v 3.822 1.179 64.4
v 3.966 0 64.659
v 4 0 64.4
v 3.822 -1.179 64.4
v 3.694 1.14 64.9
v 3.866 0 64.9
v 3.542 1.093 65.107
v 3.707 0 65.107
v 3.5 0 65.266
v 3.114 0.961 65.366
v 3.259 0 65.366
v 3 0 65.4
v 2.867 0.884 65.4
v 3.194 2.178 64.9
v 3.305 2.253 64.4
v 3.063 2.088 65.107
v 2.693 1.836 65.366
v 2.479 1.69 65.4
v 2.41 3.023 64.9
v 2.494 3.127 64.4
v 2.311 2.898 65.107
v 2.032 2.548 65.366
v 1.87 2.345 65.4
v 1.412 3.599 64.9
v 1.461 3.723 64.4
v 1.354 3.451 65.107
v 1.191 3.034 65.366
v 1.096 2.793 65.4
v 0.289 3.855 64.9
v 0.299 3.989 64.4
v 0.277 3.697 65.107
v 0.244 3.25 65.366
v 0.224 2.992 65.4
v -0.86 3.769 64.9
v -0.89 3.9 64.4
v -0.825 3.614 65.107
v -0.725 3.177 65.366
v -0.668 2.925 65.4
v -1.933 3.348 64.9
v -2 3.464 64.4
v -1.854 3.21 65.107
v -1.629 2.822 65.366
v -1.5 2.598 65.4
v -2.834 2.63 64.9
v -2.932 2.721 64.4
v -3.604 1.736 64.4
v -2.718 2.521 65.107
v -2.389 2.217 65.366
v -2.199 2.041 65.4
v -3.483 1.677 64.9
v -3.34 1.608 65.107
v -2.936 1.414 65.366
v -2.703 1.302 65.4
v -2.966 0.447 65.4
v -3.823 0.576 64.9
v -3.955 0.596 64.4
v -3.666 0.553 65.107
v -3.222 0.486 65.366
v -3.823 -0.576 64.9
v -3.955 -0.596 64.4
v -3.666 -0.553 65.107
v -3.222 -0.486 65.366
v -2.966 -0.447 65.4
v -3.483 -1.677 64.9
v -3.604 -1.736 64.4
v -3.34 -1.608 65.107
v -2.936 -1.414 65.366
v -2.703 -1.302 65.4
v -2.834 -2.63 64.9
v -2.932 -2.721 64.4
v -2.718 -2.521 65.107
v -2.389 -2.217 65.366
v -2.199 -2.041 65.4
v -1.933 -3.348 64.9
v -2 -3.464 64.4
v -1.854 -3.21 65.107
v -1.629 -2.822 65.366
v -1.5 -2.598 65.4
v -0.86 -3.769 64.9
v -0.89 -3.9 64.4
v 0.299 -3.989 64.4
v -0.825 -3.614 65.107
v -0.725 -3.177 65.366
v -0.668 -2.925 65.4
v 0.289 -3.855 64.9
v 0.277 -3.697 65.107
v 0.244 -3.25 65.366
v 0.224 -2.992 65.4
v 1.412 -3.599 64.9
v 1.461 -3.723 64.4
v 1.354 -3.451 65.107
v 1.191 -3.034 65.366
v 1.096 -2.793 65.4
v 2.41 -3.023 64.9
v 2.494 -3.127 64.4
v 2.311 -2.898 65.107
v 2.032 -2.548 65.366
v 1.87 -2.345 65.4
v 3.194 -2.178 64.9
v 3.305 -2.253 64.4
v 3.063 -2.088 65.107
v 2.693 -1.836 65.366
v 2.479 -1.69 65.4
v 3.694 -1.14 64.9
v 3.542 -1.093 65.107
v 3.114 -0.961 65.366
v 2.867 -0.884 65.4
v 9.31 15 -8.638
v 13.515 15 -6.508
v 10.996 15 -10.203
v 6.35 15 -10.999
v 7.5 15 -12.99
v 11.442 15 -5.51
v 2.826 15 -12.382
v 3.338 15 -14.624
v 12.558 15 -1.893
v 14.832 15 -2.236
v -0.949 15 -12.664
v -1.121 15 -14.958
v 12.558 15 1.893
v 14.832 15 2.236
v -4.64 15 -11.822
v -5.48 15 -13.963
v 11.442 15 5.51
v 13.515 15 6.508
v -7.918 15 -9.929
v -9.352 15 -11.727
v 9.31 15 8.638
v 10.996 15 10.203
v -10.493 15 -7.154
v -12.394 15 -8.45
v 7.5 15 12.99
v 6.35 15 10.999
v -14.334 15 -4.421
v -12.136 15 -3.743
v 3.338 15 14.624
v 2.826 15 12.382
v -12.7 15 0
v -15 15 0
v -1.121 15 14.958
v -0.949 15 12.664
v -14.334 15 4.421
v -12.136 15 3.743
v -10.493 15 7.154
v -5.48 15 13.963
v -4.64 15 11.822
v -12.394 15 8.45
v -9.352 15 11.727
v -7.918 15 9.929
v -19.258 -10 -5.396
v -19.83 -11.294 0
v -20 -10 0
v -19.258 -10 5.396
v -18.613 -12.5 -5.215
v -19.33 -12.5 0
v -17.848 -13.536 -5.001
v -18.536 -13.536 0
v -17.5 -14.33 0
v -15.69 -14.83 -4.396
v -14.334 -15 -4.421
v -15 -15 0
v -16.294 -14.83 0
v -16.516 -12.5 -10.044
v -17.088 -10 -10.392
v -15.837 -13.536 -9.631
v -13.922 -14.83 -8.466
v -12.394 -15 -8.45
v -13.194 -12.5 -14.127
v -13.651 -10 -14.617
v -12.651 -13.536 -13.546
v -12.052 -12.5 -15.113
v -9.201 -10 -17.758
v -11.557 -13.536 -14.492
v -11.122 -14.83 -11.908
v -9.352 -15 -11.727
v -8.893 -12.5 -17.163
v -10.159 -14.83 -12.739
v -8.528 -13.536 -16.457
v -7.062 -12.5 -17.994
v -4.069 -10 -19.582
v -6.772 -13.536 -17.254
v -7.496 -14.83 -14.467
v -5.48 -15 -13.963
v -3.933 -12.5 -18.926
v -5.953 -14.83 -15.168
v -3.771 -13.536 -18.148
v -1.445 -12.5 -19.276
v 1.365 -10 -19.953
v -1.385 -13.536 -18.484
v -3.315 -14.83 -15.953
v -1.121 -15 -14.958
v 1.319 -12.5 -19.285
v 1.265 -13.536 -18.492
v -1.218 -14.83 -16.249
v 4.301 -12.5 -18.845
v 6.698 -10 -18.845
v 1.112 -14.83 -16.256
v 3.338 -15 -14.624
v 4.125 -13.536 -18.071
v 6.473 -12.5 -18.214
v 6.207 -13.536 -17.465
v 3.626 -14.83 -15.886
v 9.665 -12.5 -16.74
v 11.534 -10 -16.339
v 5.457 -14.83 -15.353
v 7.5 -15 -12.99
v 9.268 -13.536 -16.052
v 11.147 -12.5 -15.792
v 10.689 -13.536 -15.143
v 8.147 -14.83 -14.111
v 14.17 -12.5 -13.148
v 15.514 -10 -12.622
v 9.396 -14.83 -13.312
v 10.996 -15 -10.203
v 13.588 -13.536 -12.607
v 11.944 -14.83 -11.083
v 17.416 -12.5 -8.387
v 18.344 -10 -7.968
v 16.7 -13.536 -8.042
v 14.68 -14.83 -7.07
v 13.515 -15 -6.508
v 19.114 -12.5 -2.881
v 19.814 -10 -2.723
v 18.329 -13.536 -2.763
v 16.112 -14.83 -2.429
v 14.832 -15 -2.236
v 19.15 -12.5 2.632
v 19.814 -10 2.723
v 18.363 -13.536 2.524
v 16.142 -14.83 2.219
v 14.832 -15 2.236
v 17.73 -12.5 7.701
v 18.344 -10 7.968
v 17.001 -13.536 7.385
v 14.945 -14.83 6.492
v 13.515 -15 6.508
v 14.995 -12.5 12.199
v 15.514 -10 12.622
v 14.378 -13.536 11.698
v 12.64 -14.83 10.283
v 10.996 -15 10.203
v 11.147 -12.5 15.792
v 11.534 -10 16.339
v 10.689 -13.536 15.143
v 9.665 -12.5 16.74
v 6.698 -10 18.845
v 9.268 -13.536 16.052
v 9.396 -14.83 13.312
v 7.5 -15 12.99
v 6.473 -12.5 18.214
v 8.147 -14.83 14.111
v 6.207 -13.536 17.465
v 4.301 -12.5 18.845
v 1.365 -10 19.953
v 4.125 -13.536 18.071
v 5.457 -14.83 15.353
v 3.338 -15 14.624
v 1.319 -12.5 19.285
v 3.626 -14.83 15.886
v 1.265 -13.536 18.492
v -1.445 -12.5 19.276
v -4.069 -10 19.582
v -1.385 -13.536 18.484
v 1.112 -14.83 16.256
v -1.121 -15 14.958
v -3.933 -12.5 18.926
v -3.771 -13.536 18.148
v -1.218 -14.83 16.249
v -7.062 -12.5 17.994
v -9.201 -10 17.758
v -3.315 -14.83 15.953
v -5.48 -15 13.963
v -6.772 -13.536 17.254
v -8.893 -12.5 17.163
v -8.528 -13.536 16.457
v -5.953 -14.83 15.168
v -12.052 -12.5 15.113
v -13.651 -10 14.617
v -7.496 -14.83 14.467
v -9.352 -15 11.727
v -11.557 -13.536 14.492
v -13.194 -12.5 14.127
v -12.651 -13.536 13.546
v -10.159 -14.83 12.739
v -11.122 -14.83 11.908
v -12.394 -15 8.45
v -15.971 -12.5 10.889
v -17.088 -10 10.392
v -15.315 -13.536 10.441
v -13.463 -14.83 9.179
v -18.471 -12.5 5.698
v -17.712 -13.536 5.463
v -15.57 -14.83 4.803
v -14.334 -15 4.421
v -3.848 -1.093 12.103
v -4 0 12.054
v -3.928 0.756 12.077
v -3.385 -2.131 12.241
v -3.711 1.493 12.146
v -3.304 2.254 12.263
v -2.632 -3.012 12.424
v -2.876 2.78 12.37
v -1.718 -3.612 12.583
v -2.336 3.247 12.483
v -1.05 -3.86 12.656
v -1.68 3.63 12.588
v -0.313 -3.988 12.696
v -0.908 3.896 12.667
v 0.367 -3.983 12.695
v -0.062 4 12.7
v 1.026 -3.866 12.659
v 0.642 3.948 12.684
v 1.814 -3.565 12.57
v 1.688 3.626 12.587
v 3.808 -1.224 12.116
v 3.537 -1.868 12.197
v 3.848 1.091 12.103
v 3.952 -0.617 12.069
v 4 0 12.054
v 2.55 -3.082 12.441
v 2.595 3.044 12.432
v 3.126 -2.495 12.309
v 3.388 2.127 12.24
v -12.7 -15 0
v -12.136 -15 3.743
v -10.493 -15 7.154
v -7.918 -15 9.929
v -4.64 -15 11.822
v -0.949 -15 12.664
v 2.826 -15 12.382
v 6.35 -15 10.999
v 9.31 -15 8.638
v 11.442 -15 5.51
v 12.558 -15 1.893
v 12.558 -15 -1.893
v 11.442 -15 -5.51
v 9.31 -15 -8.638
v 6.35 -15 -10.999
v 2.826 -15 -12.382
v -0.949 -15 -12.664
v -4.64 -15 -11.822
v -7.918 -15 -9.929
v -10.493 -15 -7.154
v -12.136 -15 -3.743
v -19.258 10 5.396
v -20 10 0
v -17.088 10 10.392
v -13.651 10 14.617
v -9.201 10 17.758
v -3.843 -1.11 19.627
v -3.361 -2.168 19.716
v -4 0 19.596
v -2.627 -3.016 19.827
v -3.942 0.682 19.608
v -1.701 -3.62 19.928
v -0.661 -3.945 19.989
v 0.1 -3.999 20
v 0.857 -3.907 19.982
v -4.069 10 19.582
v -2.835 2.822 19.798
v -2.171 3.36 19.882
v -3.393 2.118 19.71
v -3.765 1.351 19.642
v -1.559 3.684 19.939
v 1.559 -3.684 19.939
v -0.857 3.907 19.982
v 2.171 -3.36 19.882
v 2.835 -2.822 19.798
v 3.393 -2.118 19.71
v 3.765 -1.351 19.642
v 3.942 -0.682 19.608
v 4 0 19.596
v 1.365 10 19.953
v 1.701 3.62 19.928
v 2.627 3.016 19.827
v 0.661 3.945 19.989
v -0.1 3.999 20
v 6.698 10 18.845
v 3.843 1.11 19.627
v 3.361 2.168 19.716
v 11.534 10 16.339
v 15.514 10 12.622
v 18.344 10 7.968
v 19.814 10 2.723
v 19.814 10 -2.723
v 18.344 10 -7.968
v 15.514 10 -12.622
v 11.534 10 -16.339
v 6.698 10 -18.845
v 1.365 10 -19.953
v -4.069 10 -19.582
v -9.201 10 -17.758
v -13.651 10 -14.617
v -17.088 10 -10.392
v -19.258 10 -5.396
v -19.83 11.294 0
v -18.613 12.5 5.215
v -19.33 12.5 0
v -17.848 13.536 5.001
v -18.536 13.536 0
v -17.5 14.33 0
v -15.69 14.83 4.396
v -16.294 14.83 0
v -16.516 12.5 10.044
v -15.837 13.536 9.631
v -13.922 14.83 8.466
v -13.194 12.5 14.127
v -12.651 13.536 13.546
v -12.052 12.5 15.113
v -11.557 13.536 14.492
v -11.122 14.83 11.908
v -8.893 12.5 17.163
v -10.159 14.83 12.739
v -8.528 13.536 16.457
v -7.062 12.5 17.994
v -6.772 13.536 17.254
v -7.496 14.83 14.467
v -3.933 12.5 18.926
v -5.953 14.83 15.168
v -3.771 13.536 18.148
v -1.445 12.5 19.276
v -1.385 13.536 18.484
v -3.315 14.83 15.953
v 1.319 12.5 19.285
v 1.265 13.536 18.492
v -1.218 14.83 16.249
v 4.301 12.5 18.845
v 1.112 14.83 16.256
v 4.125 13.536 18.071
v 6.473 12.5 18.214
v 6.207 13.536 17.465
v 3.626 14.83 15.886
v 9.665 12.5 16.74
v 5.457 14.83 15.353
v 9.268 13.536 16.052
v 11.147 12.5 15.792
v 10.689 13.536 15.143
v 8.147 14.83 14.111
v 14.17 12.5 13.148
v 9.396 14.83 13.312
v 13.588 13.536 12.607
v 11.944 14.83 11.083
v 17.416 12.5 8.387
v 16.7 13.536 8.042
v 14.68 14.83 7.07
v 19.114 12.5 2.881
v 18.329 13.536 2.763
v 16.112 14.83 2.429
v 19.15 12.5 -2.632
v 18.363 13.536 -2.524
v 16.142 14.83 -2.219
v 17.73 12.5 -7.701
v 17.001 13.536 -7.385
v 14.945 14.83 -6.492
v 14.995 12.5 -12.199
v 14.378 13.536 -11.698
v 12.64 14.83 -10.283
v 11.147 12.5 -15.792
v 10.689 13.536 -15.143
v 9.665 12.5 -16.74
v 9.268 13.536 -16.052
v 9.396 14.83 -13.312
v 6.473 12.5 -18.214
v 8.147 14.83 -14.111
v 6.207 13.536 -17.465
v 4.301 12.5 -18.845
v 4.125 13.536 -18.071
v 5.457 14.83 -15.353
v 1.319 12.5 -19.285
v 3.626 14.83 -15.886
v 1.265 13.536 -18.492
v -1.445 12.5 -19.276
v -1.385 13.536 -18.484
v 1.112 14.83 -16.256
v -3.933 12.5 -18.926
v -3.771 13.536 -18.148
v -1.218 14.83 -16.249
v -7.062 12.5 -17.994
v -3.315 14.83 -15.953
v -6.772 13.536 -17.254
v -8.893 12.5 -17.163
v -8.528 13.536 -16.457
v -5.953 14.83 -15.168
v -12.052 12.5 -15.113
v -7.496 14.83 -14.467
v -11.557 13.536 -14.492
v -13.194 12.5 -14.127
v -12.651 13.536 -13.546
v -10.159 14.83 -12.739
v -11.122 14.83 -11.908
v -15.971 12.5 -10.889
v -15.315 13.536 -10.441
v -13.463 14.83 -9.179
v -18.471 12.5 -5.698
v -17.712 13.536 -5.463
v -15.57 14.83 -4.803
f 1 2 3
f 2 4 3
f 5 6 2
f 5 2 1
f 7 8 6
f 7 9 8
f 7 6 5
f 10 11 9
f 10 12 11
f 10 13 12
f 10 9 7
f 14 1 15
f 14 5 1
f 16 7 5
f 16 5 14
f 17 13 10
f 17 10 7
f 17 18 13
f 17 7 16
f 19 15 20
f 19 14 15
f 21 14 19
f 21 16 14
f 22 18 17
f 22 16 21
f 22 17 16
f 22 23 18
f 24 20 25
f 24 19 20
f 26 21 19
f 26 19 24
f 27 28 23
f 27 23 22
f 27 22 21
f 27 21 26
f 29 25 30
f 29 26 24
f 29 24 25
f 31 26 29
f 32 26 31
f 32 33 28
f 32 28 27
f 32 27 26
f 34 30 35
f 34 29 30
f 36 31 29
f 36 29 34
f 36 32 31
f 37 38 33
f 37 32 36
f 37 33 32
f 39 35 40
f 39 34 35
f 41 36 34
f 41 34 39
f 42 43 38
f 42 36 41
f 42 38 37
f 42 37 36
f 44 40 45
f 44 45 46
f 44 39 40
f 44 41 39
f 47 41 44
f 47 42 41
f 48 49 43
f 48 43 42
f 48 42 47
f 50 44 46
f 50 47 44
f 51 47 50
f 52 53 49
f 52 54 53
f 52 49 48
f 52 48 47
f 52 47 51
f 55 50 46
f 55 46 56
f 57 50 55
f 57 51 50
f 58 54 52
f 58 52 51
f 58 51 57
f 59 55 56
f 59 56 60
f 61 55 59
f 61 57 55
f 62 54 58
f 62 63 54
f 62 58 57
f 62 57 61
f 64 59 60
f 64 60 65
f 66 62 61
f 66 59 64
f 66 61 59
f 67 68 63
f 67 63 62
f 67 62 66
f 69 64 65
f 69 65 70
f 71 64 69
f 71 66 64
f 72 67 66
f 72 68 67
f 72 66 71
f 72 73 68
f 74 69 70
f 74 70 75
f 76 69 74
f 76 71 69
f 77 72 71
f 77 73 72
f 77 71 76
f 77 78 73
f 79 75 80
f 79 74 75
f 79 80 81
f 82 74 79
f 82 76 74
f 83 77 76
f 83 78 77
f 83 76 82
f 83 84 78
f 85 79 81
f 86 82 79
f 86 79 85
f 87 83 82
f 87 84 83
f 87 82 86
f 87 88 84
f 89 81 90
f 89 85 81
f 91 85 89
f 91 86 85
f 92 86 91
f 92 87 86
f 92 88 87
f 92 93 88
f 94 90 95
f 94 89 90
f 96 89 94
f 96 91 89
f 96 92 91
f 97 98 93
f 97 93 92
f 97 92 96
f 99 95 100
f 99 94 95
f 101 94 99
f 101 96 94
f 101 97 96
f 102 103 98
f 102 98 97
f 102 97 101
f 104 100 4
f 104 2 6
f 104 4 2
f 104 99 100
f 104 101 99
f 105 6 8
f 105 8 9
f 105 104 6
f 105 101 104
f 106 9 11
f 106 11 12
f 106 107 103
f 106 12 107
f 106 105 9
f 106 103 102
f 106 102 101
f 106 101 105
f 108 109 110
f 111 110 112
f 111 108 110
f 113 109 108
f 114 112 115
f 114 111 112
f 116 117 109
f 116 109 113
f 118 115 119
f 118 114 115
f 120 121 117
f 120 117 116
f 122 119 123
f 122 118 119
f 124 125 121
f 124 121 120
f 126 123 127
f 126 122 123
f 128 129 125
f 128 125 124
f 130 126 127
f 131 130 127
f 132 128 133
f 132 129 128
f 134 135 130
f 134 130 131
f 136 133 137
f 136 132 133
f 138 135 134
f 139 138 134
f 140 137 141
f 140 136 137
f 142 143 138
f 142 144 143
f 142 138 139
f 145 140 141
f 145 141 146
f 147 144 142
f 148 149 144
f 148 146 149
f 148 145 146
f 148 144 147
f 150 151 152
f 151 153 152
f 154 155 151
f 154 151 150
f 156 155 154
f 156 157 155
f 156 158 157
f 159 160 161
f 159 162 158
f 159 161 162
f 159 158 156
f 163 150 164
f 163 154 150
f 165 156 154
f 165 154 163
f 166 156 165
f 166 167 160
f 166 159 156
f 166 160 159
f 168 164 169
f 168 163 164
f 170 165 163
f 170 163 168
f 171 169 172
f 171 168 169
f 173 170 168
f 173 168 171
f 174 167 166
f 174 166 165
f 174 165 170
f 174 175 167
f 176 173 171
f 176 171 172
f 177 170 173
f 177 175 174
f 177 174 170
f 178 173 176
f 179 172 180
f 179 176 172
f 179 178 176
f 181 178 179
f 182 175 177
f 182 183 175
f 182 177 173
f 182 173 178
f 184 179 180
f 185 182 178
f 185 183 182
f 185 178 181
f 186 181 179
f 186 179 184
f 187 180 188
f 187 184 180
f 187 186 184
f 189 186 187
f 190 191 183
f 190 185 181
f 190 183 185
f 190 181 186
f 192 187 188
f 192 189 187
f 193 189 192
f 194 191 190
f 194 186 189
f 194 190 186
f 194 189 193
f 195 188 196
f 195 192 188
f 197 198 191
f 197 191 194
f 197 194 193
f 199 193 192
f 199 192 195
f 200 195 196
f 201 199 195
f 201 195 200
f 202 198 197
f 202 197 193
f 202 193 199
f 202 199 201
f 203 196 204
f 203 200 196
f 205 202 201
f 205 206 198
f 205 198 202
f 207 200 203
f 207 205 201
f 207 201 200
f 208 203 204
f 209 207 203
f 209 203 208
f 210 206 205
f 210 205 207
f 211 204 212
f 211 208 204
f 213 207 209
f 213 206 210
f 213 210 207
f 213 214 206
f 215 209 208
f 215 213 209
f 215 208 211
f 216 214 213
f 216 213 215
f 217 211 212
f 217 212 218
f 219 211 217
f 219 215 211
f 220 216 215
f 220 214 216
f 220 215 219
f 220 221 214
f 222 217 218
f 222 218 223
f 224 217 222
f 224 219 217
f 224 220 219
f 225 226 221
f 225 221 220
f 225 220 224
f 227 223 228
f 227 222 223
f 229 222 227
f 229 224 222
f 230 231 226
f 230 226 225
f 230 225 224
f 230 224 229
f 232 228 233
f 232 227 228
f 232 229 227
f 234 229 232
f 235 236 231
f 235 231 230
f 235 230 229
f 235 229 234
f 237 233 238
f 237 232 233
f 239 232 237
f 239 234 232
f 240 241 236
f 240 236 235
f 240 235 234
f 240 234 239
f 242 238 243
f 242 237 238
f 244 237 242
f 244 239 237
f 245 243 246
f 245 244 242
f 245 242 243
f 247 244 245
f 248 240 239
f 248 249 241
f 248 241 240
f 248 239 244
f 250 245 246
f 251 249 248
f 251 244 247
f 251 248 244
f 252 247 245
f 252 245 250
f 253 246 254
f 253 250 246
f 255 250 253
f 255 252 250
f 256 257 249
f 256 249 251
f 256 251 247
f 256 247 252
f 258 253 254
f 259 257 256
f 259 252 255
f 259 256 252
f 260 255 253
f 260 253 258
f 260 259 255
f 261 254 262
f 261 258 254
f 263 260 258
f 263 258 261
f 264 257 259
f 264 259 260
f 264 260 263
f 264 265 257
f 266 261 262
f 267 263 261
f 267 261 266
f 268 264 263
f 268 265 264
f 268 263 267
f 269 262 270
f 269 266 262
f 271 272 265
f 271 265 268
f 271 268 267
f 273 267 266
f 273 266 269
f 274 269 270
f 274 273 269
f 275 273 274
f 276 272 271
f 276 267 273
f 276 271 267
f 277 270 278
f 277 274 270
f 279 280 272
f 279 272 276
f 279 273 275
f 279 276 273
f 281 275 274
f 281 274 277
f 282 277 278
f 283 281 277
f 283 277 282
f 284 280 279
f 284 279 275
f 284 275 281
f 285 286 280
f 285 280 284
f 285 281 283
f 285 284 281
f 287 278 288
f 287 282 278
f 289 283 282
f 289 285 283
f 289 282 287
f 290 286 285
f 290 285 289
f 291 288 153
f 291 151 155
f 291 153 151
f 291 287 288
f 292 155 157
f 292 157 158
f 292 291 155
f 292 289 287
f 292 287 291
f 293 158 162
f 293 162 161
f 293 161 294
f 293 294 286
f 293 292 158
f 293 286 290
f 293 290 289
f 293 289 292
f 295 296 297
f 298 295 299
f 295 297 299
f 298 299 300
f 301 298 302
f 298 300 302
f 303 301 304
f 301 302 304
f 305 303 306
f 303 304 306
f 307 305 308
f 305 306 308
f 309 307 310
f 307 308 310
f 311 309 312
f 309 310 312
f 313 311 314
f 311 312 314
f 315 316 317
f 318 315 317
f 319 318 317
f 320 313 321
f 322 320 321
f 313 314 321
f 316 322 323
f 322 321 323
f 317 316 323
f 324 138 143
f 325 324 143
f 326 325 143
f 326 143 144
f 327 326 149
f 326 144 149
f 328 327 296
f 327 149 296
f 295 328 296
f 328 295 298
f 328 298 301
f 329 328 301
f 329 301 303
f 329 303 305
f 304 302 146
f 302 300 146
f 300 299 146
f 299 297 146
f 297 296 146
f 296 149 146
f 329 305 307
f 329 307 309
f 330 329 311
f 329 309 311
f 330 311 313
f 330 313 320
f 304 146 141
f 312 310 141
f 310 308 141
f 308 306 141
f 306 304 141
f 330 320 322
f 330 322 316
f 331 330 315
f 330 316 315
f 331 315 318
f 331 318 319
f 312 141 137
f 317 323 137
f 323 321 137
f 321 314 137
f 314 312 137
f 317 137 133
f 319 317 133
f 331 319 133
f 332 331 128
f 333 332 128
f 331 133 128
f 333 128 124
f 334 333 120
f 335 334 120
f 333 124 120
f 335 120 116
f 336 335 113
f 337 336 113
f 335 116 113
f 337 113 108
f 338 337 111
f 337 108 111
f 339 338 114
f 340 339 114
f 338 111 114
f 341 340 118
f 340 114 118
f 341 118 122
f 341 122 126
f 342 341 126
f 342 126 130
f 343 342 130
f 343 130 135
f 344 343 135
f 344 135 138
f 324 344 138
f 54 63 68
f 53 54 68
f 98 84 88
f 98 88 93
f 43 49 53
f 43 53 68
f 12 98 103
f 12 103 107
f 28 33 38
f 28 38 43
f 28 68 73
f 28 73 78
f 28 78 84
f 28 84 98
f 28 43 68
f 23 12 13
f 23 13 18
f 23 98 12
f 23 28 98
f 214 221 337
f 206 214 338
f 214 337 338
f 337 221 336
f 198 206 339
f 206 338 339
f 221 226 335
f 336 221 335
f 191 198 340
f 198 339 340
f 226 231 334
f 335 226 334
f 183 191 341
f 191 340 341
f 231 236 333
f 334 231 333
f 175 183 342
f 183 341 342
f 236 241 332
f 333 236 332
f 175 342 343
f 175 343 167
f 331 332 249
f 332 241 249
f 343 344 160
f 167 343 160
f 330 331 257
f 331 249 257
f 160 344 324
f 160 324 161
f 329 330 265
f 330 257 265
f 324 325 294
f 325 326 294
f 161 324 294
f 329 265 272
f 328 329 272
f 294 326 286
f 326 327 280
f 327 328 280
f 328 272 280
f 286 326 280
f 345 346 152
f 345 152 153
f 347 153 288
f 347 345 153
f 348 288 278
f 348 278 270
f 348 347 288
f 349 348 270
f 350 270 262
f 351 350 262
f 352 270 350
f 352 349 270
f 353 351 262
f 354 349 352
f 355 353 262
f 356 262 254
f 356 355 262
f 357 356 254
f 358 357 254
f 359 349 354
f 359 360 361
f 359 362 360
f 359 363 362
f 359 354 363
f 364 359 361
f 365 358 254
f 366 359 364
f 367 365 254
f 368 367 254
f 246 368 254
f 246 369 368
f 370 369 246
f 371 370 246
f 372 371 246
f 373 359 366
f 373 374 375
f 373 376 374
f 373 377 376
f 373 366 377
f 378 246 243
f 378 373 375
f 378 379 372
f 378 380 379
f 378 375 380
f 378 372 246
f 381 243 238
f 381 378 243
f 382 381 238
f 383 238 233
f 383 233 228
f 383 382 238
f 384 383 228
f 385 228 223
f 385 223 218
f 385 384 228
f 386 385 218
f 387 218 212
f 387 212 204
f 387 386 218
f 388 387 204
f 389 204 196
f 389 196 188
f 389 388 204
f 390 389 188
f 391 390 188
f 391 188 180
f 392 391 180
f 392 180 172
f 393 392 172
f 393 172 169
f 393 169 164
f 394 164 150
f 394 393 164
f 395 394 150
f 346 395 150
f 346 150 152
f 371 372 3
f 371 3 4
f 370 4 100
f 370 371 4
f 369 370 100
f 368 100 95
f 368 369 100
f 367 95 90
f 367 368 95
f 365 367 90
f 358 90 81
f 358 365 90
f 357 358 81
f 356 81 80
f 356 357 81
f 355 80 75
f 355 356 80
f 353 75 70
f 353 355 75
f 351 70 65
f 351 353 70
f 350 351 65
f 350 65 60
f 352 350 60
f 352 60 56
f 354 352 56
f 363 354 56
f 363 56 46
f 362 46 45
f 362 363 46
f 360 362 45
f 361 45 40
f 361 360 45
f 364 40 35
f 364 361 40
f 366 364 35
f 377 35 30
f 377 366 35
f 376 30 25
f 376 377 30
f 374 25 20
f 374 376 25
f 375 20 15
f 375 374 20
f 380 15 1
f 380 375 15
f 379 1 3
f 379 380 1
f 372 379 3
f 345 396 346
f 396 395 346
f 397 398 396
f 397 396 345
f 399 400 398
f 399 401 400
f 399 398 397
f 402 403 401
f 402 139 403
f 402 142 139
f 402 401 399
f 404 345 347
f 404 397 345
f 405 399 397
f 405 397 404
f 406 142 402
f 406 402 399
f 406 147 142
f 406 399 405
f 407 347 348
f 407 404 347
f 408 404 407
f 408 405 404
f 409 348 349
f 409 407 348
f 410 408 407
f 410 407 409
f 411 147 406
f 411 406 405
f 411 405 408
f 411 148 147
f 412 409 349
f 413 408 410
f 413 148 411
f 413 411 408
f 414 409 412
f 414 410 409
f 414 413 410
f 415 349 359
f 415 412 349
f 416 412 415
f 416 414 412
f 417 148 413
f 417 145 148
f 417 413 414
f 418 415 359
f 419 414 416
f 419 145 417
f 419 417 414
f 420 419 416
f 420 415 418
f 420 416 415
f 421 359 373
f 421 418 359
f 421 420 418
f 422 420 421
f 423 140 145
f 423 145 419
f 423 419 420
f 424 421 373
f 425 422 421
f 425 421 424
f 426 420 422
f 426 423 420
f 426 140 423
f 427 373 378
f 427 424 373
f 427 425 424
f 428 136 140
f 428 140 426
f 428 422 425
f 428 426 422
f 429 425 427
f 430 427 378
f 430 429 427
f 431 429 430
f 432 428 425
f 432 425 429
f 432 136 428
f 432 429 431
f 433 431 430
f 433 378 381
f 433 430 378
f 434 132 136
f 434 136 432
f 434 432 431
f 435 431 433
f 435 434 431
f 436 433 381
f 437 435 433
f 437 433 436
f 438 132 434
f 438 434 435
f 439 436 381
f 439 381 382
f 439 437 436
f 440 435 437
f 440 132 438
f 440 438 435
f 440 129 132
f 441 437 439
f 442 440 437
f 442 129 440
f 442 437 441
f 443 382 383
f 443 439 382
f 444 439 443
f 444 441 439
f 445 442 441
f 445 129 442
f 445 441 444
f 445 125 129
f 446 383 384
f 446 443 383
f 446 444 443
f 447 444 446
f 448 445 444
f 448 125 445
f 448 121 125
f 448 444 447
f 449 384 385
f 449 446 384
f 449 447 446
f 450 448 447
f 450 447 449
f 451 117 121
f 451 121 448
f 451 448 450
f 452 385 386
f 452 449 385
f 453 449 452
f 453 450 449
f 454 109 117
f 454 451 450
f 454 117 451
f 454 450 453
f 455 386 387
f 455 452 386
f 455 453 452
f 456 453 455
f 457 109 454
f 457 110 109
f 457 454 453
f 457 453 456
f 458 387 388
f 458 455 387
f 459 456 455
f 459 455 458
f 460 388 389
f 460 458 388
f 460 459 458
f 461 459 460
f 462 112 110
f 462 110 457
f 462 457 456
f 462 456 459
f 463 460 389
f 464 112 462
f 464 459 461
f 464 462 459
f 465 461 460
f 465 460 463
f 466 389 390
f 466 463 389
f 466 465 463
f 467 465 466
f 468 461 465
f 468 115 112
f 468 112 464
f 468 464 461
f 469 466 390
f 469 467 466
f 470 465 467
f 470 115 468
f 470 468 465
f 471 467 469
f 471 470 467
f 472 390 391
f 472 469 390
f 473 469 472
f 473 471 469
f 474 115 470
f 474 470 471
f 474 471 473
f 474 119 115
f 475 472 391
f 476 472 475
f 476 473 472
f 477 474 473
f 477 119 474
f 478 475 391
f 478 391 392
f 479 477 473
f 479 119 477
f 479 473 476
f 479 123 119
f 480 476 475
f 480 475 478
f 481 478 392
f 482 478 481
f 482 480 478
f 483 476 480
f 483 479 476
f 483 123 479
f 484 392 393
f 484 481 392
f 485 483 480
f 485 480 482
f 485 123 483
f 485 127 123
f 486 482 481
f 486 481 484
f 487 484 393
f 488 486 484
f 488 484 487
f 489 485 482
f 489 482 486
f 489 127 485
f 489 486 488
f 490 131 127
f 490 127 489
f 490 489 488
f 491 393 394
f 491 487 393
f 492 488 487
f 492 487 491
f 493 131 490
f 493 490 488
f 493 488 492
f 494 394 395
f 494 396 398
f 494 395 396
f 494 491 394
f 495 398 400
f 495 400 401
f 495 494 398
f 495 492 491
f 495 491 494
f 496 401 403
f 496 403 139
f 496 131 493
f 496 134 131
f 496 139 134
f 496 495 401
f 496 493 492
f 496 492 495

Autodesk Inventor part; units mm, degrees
ref_plane "YZ Plane" through (0, 0, 0) normal (1, 0, 0) x (0, 1, 0)
ref_plane "XZ Plane" through (0, 0, 0) normal (0, 1, 0) x (-1, 0, 0)
ref_plane "XY Plane" through (0, 0, 0) normal (0, 0, 1) x (1, 0, 0)
sketch "Sketch1" plane through (0, 0, 0) normal (0, 1, 0) x (-1, 0, 0)
  circle A0 centre (0, 0) radius 12.7
  circle A1 centre (0, 0) radius 20
  dimension "d0" = 25.4
  dimension "d1" = 40
extrude "Extrusion1" add sketch "Sketch1" along normal mid plane 30
fillet "Fillet2" radius 5 2 edges at (20, 15, 0) (20, -15, 0)
sketch "Sketch6" plane through (0, 0, 0) normal (0, 0, 1) x (1, 0, 0)
  circle A0 centre (0, 0) radius 4
  dimension "d33" = 8
extrude "Extrusion6" add sketch "Sketch6" along normal blind 65.4
sketch "Sketch7" plane through (0, 0, 0) normal (0, 1, 0) x (-1, 0, 0)
  circle A0 centre (0, 0) radius 12.7
extrude "Extrusion7" cut sketch "Sketch7" along normal through all both and the other way through all
fillet "Fillet3" radius 1 1 edges at (-4, 0, 65.4)
properties part number "suporte-barra" material "Aluminium AW-7020"
